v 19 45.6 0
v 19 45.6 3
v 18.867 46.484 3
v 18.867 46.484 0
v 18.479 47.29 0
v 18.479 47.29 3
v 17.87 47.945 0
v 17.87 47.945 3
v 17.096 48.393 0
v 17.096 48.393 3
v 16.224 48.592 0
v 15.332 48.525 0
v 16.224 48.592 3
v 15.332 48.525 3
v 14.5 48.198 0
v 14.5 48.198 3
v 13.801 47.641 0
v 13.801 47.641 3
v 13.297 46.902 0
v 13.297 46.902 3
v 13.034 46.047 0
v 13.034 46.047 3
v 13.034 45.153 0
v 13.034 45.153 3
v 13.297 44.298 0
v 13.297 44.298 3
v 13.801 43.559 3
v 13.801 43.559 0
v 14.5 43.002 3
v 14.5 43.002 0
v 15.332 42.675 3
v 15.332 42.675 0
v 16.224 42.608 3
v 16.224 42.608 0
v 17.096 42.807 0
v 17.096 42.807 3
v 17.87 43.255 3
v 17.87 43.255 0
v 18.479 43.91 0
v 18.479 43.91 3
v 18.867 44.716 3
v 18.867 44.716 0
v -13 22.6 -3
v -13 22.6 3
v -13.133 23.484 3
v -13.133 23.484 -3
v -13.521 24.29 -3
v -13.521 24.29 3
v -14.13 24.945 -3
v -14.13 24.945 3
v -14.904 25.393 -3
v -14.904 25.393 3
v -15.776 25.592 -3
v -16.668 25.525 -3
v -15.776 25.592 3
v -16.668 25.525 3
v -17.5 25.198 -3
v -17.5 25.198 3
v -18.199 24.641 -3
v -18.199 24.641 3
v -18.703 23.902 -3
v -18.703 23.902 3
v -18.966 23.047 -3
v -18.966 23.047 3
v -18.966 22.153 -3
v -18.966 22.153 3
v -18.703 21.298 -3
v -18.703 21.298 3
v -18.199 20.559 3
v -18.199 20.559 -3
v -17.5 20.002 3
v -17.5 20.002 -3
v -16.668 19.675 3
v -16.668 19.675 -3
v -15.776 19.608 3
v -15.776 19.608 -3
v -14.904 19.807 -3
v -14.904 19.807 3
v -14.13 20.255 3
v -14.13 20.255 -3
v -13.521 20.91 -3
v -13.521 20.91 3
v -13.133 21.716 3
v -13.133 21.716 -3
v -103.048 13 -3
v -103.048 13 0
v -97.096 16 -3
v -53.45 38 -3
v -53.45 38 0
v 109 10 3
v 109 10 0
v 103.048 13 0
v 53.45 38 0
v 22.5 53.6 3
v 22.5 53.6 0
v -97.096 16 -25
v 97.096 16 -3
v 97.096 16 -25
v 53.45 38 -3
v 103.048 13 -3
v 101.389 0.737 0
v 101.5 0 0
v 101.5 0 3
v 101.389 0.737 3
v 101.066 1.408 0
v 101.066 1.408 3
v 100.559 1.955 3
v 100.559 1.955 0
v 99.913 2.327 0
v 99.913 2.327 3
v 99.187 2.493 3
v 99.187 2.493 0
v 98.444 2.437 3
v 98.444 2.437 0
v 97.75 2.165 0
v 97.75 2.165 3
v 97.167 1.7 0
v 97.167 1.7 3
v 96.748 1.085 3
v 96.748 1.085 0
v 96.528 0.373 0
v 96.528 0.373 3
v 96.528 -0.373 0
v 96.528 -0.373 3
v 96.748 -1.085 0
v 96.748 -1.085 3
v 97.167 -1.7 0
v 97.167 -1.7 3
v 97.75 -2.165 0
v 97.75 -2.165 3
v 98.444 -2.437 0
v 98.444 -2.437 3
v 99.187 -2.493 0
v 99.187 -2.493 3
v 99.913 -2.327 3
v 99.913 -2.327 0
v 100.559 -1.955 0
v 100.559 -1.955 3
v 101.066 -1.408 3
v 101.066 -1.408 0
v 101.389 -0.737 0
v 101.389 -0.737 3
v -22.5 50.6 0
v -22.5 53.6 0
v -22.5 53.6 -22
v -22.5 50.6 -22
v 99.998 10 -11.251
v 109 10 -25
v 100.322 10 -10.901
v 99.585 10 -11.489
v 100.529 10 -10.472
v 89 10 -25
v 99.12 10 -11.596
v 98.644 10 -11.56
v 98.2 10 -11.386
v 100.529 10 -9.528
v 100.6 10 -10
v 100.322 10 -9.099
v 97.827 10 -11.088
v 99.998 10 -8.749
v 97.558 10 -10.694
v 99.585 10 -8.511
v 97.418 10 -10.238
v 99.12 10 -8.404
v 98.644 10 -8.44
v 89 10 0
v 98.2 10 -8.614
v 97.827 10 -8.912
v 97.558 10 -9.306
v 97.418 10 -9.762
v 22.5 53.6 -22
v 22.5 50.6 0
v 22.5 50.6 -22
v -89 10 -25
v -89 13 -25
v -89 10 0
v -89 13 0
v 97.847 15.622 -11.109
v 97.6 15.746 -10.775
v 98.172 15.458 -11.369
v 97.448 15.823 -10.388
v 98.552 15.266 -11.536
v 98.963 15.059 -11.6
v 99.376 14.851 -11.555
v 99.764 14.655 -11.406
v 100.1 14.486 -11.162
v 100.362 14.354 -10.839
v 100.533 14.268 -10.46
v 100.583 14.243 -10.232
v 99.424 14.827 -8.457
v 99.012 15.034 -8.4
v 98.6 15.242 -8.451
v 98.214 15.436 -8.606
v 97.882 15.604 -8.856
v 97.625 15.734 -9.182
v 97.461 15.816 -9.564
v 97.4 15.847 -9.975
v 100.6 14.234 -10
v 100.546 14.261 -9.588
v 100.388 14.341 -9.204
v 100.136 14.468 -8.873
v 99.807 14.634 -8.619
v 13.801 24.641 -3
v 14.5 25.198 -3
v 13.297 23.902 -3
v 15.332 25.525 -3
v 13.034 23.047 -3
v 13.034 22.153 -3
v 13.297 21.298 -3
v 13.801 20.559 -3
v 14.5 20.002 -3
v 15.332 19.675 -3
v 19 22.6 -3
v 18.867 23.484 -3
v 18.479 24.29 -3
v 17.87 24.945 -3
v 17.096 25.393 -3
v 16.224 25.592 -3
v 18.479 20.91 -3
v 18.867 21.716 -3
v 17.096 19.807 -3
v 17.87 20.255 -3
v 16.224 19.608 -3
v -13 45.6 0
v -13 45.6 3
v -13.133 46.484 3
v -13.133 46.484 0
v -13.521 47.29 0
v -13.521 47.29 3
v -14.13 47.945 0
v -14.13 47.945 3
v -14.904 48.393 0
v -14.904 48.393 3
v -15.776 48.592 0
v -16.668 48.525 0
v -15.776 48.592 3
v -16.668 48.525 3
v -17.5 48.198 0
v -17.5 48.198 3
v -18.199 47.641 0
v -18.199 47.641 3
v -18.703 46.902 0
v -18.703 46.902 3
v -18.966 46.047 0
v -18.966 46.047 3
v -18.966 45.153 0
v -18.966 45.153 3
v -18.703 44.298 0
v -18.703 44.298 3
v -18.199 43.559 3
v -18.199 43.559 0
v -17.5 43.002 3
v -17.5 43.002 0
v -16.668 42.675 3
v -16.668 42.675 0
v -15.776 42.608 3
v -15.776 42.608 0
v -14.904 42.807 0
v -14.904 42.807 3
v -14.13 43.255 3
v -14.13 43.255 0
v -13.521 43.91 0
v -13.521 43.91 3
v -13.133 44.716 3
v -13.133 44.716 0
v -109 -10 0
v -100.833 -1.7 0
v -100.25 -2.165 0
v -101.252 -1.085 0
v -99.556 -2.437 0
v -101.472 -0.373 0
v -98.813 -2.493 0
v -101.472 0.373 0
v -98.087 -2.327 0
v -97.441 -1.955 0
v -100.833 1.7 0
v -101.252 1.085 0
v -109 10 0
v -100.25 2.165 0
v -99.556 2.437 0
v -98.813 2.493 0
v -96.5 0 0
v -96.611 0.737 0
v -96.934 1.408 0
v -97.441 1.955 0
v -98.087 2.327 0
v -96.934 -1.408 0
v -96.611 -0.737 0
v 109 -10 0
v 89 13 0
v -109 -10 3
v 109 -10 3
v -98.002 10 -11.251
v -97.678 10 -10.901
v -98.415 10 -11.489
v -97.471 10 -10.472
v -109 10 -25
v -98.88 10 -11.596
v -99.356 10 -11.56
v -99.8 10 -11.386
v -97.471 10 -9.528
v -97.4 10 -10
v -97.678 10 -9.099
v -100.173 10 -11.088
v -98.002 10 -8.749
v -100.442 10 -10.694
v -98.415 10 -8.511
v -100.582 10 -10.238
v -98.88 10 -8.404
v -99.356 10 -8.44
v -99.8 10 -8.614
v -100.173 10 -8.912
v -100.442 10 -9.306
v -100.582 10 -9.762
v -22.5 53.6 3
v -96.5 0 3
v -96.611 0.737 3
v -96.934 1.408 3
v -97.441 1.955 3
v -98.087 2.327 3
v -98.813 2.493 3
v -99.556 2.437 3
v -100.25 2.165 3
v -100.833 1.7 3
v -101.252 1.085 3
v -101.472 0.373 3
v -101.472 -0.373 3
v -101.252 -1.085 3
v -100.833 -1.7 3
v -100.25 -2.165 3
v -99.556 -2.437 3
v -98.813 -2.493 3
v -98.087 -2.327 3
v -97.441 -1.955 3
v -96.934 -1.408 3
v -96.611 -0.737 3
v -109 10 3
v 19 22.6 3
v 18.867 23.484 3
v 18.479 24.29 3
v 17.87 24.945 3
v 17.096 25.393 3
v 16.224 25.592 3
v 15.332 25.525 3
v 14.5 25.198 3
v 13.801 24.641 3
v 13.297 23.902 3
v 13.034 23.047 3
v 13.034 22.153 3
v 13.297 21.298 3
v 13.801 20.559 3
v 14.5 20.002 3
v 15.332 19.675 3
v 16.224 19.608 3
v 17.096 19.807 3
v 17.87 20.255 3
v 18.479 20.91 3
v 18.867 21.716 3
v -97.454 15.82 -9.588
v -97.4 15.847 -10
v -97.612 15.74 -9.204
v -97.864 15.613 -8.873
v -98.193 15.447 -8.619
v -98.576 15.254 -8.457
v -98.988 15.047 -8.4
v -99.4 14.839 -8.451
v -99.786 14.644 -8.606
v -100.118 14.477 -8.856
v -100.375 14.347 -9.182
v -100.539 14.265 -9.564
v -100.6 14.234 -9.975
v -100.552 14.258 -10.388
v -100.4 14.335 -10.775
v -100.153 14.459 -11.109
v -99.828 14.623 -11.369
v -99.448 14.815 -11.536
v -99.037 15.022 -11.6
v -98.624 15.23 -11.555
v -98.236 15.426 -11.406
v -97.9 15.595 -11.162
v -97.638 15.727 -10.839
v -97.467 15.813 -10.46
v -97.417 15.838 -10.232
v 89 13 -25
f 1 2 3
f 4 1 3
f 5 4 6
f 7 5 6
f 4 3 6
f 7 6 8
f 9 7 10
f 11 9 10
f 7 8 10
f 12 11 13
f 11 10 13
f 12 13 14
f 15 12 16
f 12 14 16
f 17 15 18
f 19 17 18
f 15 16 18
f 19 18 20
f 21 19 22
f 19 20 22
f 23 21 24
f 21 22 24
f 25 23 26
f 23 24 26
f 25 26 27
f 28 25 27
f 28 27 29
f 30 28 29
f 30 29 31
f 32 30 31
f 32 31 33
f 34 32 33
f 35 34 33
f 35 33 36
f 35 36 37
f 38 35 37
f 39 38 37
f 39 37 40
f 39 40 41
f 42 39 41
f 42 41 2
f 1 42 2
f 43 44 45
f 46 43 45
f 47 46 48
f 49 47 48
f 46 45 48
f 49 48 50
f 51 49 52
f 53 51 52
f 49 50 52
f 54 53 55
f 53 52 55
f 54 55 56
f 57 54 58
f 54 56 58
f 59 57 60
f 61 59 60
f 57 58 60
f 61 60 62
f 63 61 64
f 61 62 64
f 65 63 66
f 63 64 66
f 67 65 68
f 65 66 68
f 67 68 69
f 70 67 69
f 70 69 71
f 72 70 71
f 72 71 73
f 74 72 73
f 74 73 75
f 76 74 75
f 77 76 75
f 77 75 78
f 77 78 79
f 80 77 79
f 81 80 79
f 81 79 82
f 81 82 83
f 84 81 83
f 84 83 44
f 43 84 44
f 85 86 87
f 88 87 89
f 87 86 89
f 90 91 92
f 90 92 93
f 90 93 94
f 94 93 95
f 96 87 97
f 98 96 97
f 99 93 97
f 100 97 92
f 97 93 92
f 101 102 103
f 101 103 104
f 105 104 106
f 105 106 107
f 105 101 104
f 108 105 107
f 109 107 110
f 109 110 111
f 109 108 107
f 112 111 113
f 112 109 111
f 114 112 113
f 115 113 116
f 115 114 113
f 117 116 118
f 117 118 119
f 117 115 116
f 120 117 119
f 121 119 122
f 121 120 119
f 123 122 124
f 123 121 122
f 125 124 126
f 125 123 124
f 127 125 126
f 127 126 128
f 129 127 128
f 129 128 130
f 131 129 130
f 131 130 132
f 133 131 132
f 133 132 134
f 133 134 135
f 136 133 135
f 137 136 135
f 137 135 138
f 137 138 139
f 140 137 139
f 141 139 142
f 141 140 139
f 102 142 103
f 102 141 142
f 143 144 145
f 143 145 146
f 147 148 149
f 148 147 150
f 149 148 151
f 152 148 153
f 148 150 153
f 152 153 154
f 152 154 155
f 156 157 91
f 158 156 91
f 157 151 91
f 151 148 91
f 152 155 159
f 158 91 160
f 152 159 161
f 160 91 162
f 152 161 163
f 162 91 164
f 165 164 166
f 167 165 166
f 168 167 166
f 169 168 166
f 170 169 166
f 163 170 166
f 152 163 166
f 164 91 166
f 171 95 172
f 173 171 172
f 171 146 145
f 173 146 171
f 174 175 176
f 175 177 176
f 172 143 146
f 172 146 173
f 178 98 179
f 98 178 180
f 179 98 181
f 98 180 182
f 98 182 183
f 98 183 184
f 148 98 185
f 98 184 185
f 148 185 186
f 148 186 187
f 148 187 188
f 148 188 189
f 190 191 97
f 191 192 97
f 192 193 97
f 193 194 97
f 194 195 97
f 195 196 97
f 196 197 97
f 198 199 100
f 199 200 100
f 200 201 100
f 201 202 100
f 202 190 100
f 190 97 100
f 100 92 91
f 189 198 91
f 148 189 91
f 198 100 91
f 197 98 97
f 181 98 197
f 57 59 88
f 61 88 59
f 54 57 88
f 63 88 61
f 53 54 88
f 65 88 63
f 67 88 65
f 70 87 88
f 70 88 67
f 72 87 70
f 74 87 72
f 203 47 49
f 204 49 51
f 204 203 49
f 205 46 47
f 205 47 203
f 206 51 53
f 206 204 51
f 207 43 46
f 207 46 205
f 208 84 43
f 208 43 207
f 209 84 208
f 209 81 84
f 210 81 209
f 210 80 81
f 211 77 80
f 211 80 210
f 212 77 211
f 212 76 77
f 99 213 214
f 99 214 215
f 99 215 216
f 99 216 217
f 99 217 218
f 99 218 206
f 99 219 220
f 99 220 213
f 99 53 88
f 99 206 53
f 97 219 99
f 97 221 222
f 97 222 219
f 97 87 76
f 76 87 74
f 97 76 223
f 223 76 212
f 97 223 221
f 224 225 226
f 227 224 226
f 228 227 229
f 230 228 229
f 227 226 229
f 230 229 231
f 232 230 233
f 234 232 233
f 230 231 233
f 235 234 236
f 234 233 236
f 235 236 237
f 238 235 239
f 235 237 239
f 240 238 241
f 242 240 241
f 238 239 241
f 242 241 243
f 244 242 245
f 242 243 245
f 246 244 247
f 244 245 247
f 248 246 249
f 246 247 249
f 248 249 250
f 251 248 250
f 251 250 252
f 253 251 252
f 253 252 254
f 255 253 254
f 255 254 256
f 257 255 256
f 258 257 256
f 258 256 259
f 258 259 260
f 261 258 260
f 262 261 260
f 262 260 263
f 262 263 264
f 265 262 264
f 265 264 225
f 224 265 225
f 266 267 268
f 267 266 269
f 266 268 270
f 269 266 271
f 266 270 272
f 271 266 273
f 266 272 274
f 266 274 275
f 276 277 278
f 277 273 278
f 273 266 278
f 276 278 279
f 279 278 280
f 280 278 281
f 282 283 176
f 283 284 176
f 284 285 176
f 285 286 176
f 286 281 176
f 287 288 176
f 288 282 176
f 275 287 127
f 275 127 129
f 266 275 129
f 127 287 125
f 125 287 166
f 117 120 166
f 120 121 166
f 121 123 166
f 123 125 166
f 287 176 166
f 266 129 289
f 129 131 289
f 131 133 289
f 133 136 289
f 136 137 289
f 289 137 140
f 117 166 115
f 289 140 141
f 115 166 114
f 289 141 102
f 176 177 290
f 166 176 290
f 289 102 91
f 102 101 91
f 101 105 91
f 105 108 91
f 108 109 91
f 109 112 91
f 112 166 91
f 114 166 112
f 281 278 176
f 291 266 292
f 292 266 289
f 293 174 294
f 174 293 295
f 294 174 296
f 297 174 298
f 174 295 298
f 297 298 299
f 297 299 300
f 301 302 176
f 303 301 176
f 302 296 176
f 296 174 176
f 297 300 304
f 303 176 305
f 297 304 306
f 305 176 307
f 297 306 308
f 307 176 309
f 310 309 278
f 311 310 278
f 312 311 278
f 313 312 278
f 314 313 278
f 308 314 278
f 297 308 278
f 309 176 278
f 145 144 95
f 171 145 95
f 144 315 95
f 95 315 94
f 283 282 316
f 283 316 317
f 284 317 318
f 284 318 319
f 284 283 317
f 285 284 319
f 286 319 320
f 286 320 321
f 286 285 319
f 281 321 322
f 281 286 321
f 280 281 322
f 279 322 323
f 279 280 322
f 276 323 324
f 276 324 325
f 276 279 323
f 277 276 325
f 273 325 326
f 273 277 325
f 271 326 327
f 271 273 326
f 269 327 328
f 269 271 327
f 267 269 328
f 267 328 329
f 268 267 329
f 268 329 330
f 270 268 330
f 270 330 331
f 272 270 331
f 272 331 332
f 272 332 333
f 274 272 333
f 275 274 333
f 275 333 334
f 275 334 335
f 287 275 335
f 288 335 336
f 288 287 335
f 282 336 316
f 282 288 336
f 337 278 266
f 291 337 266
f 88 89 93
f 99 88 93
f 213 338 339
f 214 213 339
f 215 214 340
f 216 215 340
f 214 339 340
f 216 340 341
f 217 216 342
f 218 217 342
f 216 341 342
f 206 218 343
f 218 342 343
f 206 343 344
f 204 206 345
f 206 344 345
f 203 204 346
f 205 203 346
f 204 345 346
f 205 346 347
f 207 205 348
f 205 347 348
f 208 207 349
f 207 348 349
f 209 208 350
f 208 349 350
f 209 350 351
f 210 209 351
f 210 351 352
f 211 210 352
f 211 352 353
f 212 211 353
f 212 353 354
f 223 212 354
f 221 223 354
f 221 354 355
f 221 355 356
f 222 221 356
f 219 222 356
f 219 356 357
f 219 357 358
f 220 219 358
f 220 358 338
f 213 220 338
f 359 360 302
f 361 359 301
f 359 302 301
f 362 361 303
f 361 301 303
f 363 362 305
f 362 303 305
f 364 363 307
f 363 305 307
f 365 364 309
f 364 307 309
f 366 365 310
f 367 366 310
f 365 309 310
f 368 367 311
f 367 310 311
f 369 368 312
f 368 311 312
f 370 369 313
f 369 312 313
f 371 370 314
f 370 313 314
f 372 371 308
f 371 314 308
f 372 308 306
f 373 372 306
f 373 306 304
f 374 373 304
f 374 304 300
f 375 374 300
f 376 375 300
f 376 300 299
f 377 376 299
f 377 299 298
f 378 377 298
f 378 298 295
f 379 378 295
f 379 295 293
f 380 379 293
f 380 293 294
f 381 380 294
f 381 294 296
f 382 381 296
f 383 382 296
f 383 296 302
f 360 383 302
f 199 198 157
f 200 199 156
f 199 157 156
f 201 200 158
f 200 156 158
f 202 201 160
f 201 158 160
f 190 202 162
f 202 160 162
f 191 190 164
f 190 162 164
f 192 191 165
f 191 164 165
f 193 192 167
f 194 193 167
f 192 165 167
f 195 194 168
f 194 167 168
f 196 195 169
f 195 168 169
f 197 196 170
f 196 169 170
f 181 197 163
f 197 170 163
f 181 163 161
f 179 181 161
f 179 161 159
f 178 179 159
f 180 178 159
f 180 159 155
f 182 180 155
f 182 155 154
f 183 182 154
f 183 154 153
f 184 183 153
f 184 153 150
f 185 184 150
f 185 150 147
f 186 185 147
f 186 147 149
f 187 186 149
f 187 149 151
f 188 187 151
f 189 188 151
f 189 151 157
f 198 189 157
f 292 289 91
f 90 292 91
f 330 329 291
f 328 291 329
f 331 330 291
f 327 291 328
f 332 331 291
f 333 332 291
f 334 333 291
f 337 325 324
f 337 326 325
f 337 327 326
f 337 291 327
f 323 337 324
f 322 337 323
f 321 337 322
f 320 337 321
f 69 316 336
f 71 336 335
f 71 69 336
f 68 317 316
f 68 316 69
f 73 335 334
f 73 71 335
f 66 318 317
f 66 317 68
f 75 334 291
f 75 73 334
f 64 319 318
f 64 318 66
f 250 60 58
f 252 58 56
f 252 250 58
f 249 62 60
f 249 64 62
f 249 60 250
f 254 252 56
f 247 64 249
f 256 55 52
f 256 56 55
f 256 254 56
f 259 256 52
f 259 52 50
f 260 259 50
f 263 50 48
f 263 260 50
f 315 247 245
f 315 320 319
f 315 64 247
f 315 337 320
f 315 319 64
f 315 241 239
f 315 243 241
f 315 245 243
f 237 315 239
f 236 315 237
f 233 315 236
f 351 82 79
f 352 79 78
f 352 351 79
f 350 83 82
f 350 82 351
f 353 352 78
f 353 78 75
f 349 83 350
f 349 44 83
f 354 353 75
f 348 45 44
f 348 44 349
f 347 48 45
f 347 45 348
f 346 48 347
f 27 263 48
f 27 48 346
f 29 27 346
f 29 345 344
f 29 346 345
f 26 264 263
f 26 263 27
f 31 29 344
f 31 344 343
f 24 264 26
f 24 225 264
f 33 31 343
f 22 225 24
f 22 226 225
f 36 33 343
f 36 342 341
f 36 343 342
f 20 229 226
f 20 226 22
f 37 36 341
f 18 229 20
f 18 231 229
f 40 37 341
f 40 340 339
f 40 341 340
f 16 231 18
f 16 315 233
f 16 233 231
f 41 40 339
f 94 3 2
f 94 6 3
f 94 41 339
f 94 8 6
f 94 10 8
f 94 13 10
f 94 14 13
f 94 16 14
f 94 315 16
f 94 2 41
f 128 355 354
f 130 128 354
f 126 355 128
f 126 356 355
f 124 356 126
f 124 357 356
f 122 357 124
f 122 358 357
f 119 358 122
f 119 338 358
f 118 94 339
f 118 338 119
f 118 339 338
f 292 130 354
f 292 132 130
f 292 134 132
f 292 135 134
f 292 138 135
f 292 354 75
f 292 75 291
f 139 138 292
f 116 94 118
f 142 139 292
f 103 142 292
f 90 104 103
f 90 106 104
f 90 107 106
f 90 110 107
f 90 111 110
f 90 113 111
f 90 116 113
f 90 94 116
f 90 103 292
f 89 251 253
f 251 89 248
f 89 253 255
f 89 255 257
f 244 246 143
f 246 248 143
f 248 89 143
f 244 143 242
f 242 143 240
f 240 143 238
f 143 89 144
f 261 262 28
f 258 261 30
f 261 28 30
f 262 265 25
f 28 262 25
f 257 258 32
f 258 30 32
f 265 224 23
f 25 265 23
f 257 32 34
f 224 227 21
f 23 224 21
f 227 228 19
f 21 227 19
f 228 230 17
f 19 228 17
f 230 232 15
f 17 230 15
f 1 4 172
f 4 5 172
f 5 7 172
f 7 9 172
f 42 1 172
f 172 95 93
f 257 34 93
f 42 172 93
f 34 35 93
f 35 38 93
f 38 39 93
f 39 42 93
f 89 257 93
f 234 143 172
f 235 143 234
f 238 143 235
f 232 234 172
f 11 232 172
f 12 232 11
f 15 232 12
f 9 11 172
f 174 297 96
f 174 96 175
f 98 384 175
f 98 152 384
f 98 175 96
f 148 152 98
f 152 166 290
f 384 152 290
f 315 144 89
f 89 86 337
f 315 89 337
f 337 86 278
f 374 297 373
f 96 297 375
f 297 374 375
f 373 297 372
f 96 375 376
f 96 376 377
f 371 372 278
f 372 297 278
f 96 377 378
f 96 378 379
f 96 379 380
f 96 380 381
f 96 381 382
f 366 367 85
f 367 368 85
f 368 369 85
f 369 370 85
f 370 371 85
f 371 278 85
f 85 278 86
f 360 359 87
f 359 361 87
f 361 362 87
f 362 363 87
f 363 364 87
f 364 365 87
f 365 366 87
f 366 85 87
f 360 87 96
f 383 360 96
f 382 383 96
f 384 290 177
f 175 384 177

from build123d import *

# Parameters (mm, degrees)
F0_R      = 2.5
F1_DEPTH  = 3
F2_W      = 45
F2_H      = 3
F3_DEPTH  = 22
F5_DEPTH  = 3
F7_DEPTH  = 22
F8_R      = 1.6
F9_DEPTH  = 6
F10_R     = 3
F11_DEPTH = 25
F12_DEPTH = 30


with BuildPart() as f1:
    # F0 (on Top) → F1 (new body)
    with BuildSketch(Plane.XY):
        Polygon((18, -10), (109, -10), (109, 10), (22.5, 53.6), (-22.5, 53.6), (-109, 10), (-109, -10), (3, -10), align=None)
        with Locations((-99, 0)):
            Circle(F0_R, mode=Mode.SUBTRACT)
        with Locations((99, 0)):
            Circle(F0_R, mode=Mode.SUBTRACT)
    extrude(amount=F1_DEPTH)

    # F2 (on face) → F3 (join)
    with BuildSketch(Plane(origin=(0, 0, 0), x_dir=(1, 0, 0), z_dir=(0, 0, -1))):
        with Locations((0, -52.1)):
            Rectangle(F2_W, F2_H)
    extrude(amount=F3_DEPTH)

    # F4 (on face) → F5 (join)
    with BuildSketch(Plane(origin=(0, 0, 0), x_dir=(1, 0, 0), z_dir=(0, 0, -1))):
        Polygon((89, -13), (-89, -13), (-89, -10), (-109, -10), (-103.048165, -13), (-53.449541, -38), (53.449541, -38), (103.048165, -13), (109, -10), (89, -10), align=None)
    extrude(amount=F5_DEPTH)

    # F6 (on face) → F7 (join)
    with BuildSketch(Plane(origin=(0, 0, -3), x_dir=(1, 0, 0), z_dir=(0, 0, -1))):
        Polygon((89, -13), (-89, -13), (-89, -10), (-109, -10), (-97.09633, -16), (97.09633, -16), (109, -10), (89, -10), align=None)
    extrude(amount=F7_DEPTH)

    # F8 (on face) → F9 (cut)
    with BuildSketch(Plane.XZ.offset(-10)):
        with Locations((-99, -10)):
            Circle(F8_R)
        with Locations((99, -10)):
            Circle(F8_R)
    extrude(amount=-F9_DEPTH, mode=Mode.SUBTRACT)

    # F10 (on face) → F11 (cut)
    with BuildSketch(Plane.XY.offset(3)):
        with Locations((-16, 45.6)):
            Circle(F10_R)
        with Locations((-16, 22.6)):
            Circle(F10_R)
        with Locations((16, 22.6)):
            Circle(F10_R)
        with Locations((16, 45.6)):
            Circle(F10_R)
    extrude(amount=-F11_DEPTH, mode=Mode.SUBTRACT)

    # F10 (on face) → F12 (cut)
    with BuildSketch(Plane.XY.offset(3)):
        with Locations((-16, 45.6)):
            Circle(F10_R)
        with Locations((-16, 22.6)):
            Circle(F10_R)
        with Locations((16, 22.6)):
            Circle(F10_R)
        with Locations((16, 45.6)):
            Circle(F10_R)
    extrude(amount=-F12_DEPTH, mode=Mode.SUBTRACT)


solid = f1.part
